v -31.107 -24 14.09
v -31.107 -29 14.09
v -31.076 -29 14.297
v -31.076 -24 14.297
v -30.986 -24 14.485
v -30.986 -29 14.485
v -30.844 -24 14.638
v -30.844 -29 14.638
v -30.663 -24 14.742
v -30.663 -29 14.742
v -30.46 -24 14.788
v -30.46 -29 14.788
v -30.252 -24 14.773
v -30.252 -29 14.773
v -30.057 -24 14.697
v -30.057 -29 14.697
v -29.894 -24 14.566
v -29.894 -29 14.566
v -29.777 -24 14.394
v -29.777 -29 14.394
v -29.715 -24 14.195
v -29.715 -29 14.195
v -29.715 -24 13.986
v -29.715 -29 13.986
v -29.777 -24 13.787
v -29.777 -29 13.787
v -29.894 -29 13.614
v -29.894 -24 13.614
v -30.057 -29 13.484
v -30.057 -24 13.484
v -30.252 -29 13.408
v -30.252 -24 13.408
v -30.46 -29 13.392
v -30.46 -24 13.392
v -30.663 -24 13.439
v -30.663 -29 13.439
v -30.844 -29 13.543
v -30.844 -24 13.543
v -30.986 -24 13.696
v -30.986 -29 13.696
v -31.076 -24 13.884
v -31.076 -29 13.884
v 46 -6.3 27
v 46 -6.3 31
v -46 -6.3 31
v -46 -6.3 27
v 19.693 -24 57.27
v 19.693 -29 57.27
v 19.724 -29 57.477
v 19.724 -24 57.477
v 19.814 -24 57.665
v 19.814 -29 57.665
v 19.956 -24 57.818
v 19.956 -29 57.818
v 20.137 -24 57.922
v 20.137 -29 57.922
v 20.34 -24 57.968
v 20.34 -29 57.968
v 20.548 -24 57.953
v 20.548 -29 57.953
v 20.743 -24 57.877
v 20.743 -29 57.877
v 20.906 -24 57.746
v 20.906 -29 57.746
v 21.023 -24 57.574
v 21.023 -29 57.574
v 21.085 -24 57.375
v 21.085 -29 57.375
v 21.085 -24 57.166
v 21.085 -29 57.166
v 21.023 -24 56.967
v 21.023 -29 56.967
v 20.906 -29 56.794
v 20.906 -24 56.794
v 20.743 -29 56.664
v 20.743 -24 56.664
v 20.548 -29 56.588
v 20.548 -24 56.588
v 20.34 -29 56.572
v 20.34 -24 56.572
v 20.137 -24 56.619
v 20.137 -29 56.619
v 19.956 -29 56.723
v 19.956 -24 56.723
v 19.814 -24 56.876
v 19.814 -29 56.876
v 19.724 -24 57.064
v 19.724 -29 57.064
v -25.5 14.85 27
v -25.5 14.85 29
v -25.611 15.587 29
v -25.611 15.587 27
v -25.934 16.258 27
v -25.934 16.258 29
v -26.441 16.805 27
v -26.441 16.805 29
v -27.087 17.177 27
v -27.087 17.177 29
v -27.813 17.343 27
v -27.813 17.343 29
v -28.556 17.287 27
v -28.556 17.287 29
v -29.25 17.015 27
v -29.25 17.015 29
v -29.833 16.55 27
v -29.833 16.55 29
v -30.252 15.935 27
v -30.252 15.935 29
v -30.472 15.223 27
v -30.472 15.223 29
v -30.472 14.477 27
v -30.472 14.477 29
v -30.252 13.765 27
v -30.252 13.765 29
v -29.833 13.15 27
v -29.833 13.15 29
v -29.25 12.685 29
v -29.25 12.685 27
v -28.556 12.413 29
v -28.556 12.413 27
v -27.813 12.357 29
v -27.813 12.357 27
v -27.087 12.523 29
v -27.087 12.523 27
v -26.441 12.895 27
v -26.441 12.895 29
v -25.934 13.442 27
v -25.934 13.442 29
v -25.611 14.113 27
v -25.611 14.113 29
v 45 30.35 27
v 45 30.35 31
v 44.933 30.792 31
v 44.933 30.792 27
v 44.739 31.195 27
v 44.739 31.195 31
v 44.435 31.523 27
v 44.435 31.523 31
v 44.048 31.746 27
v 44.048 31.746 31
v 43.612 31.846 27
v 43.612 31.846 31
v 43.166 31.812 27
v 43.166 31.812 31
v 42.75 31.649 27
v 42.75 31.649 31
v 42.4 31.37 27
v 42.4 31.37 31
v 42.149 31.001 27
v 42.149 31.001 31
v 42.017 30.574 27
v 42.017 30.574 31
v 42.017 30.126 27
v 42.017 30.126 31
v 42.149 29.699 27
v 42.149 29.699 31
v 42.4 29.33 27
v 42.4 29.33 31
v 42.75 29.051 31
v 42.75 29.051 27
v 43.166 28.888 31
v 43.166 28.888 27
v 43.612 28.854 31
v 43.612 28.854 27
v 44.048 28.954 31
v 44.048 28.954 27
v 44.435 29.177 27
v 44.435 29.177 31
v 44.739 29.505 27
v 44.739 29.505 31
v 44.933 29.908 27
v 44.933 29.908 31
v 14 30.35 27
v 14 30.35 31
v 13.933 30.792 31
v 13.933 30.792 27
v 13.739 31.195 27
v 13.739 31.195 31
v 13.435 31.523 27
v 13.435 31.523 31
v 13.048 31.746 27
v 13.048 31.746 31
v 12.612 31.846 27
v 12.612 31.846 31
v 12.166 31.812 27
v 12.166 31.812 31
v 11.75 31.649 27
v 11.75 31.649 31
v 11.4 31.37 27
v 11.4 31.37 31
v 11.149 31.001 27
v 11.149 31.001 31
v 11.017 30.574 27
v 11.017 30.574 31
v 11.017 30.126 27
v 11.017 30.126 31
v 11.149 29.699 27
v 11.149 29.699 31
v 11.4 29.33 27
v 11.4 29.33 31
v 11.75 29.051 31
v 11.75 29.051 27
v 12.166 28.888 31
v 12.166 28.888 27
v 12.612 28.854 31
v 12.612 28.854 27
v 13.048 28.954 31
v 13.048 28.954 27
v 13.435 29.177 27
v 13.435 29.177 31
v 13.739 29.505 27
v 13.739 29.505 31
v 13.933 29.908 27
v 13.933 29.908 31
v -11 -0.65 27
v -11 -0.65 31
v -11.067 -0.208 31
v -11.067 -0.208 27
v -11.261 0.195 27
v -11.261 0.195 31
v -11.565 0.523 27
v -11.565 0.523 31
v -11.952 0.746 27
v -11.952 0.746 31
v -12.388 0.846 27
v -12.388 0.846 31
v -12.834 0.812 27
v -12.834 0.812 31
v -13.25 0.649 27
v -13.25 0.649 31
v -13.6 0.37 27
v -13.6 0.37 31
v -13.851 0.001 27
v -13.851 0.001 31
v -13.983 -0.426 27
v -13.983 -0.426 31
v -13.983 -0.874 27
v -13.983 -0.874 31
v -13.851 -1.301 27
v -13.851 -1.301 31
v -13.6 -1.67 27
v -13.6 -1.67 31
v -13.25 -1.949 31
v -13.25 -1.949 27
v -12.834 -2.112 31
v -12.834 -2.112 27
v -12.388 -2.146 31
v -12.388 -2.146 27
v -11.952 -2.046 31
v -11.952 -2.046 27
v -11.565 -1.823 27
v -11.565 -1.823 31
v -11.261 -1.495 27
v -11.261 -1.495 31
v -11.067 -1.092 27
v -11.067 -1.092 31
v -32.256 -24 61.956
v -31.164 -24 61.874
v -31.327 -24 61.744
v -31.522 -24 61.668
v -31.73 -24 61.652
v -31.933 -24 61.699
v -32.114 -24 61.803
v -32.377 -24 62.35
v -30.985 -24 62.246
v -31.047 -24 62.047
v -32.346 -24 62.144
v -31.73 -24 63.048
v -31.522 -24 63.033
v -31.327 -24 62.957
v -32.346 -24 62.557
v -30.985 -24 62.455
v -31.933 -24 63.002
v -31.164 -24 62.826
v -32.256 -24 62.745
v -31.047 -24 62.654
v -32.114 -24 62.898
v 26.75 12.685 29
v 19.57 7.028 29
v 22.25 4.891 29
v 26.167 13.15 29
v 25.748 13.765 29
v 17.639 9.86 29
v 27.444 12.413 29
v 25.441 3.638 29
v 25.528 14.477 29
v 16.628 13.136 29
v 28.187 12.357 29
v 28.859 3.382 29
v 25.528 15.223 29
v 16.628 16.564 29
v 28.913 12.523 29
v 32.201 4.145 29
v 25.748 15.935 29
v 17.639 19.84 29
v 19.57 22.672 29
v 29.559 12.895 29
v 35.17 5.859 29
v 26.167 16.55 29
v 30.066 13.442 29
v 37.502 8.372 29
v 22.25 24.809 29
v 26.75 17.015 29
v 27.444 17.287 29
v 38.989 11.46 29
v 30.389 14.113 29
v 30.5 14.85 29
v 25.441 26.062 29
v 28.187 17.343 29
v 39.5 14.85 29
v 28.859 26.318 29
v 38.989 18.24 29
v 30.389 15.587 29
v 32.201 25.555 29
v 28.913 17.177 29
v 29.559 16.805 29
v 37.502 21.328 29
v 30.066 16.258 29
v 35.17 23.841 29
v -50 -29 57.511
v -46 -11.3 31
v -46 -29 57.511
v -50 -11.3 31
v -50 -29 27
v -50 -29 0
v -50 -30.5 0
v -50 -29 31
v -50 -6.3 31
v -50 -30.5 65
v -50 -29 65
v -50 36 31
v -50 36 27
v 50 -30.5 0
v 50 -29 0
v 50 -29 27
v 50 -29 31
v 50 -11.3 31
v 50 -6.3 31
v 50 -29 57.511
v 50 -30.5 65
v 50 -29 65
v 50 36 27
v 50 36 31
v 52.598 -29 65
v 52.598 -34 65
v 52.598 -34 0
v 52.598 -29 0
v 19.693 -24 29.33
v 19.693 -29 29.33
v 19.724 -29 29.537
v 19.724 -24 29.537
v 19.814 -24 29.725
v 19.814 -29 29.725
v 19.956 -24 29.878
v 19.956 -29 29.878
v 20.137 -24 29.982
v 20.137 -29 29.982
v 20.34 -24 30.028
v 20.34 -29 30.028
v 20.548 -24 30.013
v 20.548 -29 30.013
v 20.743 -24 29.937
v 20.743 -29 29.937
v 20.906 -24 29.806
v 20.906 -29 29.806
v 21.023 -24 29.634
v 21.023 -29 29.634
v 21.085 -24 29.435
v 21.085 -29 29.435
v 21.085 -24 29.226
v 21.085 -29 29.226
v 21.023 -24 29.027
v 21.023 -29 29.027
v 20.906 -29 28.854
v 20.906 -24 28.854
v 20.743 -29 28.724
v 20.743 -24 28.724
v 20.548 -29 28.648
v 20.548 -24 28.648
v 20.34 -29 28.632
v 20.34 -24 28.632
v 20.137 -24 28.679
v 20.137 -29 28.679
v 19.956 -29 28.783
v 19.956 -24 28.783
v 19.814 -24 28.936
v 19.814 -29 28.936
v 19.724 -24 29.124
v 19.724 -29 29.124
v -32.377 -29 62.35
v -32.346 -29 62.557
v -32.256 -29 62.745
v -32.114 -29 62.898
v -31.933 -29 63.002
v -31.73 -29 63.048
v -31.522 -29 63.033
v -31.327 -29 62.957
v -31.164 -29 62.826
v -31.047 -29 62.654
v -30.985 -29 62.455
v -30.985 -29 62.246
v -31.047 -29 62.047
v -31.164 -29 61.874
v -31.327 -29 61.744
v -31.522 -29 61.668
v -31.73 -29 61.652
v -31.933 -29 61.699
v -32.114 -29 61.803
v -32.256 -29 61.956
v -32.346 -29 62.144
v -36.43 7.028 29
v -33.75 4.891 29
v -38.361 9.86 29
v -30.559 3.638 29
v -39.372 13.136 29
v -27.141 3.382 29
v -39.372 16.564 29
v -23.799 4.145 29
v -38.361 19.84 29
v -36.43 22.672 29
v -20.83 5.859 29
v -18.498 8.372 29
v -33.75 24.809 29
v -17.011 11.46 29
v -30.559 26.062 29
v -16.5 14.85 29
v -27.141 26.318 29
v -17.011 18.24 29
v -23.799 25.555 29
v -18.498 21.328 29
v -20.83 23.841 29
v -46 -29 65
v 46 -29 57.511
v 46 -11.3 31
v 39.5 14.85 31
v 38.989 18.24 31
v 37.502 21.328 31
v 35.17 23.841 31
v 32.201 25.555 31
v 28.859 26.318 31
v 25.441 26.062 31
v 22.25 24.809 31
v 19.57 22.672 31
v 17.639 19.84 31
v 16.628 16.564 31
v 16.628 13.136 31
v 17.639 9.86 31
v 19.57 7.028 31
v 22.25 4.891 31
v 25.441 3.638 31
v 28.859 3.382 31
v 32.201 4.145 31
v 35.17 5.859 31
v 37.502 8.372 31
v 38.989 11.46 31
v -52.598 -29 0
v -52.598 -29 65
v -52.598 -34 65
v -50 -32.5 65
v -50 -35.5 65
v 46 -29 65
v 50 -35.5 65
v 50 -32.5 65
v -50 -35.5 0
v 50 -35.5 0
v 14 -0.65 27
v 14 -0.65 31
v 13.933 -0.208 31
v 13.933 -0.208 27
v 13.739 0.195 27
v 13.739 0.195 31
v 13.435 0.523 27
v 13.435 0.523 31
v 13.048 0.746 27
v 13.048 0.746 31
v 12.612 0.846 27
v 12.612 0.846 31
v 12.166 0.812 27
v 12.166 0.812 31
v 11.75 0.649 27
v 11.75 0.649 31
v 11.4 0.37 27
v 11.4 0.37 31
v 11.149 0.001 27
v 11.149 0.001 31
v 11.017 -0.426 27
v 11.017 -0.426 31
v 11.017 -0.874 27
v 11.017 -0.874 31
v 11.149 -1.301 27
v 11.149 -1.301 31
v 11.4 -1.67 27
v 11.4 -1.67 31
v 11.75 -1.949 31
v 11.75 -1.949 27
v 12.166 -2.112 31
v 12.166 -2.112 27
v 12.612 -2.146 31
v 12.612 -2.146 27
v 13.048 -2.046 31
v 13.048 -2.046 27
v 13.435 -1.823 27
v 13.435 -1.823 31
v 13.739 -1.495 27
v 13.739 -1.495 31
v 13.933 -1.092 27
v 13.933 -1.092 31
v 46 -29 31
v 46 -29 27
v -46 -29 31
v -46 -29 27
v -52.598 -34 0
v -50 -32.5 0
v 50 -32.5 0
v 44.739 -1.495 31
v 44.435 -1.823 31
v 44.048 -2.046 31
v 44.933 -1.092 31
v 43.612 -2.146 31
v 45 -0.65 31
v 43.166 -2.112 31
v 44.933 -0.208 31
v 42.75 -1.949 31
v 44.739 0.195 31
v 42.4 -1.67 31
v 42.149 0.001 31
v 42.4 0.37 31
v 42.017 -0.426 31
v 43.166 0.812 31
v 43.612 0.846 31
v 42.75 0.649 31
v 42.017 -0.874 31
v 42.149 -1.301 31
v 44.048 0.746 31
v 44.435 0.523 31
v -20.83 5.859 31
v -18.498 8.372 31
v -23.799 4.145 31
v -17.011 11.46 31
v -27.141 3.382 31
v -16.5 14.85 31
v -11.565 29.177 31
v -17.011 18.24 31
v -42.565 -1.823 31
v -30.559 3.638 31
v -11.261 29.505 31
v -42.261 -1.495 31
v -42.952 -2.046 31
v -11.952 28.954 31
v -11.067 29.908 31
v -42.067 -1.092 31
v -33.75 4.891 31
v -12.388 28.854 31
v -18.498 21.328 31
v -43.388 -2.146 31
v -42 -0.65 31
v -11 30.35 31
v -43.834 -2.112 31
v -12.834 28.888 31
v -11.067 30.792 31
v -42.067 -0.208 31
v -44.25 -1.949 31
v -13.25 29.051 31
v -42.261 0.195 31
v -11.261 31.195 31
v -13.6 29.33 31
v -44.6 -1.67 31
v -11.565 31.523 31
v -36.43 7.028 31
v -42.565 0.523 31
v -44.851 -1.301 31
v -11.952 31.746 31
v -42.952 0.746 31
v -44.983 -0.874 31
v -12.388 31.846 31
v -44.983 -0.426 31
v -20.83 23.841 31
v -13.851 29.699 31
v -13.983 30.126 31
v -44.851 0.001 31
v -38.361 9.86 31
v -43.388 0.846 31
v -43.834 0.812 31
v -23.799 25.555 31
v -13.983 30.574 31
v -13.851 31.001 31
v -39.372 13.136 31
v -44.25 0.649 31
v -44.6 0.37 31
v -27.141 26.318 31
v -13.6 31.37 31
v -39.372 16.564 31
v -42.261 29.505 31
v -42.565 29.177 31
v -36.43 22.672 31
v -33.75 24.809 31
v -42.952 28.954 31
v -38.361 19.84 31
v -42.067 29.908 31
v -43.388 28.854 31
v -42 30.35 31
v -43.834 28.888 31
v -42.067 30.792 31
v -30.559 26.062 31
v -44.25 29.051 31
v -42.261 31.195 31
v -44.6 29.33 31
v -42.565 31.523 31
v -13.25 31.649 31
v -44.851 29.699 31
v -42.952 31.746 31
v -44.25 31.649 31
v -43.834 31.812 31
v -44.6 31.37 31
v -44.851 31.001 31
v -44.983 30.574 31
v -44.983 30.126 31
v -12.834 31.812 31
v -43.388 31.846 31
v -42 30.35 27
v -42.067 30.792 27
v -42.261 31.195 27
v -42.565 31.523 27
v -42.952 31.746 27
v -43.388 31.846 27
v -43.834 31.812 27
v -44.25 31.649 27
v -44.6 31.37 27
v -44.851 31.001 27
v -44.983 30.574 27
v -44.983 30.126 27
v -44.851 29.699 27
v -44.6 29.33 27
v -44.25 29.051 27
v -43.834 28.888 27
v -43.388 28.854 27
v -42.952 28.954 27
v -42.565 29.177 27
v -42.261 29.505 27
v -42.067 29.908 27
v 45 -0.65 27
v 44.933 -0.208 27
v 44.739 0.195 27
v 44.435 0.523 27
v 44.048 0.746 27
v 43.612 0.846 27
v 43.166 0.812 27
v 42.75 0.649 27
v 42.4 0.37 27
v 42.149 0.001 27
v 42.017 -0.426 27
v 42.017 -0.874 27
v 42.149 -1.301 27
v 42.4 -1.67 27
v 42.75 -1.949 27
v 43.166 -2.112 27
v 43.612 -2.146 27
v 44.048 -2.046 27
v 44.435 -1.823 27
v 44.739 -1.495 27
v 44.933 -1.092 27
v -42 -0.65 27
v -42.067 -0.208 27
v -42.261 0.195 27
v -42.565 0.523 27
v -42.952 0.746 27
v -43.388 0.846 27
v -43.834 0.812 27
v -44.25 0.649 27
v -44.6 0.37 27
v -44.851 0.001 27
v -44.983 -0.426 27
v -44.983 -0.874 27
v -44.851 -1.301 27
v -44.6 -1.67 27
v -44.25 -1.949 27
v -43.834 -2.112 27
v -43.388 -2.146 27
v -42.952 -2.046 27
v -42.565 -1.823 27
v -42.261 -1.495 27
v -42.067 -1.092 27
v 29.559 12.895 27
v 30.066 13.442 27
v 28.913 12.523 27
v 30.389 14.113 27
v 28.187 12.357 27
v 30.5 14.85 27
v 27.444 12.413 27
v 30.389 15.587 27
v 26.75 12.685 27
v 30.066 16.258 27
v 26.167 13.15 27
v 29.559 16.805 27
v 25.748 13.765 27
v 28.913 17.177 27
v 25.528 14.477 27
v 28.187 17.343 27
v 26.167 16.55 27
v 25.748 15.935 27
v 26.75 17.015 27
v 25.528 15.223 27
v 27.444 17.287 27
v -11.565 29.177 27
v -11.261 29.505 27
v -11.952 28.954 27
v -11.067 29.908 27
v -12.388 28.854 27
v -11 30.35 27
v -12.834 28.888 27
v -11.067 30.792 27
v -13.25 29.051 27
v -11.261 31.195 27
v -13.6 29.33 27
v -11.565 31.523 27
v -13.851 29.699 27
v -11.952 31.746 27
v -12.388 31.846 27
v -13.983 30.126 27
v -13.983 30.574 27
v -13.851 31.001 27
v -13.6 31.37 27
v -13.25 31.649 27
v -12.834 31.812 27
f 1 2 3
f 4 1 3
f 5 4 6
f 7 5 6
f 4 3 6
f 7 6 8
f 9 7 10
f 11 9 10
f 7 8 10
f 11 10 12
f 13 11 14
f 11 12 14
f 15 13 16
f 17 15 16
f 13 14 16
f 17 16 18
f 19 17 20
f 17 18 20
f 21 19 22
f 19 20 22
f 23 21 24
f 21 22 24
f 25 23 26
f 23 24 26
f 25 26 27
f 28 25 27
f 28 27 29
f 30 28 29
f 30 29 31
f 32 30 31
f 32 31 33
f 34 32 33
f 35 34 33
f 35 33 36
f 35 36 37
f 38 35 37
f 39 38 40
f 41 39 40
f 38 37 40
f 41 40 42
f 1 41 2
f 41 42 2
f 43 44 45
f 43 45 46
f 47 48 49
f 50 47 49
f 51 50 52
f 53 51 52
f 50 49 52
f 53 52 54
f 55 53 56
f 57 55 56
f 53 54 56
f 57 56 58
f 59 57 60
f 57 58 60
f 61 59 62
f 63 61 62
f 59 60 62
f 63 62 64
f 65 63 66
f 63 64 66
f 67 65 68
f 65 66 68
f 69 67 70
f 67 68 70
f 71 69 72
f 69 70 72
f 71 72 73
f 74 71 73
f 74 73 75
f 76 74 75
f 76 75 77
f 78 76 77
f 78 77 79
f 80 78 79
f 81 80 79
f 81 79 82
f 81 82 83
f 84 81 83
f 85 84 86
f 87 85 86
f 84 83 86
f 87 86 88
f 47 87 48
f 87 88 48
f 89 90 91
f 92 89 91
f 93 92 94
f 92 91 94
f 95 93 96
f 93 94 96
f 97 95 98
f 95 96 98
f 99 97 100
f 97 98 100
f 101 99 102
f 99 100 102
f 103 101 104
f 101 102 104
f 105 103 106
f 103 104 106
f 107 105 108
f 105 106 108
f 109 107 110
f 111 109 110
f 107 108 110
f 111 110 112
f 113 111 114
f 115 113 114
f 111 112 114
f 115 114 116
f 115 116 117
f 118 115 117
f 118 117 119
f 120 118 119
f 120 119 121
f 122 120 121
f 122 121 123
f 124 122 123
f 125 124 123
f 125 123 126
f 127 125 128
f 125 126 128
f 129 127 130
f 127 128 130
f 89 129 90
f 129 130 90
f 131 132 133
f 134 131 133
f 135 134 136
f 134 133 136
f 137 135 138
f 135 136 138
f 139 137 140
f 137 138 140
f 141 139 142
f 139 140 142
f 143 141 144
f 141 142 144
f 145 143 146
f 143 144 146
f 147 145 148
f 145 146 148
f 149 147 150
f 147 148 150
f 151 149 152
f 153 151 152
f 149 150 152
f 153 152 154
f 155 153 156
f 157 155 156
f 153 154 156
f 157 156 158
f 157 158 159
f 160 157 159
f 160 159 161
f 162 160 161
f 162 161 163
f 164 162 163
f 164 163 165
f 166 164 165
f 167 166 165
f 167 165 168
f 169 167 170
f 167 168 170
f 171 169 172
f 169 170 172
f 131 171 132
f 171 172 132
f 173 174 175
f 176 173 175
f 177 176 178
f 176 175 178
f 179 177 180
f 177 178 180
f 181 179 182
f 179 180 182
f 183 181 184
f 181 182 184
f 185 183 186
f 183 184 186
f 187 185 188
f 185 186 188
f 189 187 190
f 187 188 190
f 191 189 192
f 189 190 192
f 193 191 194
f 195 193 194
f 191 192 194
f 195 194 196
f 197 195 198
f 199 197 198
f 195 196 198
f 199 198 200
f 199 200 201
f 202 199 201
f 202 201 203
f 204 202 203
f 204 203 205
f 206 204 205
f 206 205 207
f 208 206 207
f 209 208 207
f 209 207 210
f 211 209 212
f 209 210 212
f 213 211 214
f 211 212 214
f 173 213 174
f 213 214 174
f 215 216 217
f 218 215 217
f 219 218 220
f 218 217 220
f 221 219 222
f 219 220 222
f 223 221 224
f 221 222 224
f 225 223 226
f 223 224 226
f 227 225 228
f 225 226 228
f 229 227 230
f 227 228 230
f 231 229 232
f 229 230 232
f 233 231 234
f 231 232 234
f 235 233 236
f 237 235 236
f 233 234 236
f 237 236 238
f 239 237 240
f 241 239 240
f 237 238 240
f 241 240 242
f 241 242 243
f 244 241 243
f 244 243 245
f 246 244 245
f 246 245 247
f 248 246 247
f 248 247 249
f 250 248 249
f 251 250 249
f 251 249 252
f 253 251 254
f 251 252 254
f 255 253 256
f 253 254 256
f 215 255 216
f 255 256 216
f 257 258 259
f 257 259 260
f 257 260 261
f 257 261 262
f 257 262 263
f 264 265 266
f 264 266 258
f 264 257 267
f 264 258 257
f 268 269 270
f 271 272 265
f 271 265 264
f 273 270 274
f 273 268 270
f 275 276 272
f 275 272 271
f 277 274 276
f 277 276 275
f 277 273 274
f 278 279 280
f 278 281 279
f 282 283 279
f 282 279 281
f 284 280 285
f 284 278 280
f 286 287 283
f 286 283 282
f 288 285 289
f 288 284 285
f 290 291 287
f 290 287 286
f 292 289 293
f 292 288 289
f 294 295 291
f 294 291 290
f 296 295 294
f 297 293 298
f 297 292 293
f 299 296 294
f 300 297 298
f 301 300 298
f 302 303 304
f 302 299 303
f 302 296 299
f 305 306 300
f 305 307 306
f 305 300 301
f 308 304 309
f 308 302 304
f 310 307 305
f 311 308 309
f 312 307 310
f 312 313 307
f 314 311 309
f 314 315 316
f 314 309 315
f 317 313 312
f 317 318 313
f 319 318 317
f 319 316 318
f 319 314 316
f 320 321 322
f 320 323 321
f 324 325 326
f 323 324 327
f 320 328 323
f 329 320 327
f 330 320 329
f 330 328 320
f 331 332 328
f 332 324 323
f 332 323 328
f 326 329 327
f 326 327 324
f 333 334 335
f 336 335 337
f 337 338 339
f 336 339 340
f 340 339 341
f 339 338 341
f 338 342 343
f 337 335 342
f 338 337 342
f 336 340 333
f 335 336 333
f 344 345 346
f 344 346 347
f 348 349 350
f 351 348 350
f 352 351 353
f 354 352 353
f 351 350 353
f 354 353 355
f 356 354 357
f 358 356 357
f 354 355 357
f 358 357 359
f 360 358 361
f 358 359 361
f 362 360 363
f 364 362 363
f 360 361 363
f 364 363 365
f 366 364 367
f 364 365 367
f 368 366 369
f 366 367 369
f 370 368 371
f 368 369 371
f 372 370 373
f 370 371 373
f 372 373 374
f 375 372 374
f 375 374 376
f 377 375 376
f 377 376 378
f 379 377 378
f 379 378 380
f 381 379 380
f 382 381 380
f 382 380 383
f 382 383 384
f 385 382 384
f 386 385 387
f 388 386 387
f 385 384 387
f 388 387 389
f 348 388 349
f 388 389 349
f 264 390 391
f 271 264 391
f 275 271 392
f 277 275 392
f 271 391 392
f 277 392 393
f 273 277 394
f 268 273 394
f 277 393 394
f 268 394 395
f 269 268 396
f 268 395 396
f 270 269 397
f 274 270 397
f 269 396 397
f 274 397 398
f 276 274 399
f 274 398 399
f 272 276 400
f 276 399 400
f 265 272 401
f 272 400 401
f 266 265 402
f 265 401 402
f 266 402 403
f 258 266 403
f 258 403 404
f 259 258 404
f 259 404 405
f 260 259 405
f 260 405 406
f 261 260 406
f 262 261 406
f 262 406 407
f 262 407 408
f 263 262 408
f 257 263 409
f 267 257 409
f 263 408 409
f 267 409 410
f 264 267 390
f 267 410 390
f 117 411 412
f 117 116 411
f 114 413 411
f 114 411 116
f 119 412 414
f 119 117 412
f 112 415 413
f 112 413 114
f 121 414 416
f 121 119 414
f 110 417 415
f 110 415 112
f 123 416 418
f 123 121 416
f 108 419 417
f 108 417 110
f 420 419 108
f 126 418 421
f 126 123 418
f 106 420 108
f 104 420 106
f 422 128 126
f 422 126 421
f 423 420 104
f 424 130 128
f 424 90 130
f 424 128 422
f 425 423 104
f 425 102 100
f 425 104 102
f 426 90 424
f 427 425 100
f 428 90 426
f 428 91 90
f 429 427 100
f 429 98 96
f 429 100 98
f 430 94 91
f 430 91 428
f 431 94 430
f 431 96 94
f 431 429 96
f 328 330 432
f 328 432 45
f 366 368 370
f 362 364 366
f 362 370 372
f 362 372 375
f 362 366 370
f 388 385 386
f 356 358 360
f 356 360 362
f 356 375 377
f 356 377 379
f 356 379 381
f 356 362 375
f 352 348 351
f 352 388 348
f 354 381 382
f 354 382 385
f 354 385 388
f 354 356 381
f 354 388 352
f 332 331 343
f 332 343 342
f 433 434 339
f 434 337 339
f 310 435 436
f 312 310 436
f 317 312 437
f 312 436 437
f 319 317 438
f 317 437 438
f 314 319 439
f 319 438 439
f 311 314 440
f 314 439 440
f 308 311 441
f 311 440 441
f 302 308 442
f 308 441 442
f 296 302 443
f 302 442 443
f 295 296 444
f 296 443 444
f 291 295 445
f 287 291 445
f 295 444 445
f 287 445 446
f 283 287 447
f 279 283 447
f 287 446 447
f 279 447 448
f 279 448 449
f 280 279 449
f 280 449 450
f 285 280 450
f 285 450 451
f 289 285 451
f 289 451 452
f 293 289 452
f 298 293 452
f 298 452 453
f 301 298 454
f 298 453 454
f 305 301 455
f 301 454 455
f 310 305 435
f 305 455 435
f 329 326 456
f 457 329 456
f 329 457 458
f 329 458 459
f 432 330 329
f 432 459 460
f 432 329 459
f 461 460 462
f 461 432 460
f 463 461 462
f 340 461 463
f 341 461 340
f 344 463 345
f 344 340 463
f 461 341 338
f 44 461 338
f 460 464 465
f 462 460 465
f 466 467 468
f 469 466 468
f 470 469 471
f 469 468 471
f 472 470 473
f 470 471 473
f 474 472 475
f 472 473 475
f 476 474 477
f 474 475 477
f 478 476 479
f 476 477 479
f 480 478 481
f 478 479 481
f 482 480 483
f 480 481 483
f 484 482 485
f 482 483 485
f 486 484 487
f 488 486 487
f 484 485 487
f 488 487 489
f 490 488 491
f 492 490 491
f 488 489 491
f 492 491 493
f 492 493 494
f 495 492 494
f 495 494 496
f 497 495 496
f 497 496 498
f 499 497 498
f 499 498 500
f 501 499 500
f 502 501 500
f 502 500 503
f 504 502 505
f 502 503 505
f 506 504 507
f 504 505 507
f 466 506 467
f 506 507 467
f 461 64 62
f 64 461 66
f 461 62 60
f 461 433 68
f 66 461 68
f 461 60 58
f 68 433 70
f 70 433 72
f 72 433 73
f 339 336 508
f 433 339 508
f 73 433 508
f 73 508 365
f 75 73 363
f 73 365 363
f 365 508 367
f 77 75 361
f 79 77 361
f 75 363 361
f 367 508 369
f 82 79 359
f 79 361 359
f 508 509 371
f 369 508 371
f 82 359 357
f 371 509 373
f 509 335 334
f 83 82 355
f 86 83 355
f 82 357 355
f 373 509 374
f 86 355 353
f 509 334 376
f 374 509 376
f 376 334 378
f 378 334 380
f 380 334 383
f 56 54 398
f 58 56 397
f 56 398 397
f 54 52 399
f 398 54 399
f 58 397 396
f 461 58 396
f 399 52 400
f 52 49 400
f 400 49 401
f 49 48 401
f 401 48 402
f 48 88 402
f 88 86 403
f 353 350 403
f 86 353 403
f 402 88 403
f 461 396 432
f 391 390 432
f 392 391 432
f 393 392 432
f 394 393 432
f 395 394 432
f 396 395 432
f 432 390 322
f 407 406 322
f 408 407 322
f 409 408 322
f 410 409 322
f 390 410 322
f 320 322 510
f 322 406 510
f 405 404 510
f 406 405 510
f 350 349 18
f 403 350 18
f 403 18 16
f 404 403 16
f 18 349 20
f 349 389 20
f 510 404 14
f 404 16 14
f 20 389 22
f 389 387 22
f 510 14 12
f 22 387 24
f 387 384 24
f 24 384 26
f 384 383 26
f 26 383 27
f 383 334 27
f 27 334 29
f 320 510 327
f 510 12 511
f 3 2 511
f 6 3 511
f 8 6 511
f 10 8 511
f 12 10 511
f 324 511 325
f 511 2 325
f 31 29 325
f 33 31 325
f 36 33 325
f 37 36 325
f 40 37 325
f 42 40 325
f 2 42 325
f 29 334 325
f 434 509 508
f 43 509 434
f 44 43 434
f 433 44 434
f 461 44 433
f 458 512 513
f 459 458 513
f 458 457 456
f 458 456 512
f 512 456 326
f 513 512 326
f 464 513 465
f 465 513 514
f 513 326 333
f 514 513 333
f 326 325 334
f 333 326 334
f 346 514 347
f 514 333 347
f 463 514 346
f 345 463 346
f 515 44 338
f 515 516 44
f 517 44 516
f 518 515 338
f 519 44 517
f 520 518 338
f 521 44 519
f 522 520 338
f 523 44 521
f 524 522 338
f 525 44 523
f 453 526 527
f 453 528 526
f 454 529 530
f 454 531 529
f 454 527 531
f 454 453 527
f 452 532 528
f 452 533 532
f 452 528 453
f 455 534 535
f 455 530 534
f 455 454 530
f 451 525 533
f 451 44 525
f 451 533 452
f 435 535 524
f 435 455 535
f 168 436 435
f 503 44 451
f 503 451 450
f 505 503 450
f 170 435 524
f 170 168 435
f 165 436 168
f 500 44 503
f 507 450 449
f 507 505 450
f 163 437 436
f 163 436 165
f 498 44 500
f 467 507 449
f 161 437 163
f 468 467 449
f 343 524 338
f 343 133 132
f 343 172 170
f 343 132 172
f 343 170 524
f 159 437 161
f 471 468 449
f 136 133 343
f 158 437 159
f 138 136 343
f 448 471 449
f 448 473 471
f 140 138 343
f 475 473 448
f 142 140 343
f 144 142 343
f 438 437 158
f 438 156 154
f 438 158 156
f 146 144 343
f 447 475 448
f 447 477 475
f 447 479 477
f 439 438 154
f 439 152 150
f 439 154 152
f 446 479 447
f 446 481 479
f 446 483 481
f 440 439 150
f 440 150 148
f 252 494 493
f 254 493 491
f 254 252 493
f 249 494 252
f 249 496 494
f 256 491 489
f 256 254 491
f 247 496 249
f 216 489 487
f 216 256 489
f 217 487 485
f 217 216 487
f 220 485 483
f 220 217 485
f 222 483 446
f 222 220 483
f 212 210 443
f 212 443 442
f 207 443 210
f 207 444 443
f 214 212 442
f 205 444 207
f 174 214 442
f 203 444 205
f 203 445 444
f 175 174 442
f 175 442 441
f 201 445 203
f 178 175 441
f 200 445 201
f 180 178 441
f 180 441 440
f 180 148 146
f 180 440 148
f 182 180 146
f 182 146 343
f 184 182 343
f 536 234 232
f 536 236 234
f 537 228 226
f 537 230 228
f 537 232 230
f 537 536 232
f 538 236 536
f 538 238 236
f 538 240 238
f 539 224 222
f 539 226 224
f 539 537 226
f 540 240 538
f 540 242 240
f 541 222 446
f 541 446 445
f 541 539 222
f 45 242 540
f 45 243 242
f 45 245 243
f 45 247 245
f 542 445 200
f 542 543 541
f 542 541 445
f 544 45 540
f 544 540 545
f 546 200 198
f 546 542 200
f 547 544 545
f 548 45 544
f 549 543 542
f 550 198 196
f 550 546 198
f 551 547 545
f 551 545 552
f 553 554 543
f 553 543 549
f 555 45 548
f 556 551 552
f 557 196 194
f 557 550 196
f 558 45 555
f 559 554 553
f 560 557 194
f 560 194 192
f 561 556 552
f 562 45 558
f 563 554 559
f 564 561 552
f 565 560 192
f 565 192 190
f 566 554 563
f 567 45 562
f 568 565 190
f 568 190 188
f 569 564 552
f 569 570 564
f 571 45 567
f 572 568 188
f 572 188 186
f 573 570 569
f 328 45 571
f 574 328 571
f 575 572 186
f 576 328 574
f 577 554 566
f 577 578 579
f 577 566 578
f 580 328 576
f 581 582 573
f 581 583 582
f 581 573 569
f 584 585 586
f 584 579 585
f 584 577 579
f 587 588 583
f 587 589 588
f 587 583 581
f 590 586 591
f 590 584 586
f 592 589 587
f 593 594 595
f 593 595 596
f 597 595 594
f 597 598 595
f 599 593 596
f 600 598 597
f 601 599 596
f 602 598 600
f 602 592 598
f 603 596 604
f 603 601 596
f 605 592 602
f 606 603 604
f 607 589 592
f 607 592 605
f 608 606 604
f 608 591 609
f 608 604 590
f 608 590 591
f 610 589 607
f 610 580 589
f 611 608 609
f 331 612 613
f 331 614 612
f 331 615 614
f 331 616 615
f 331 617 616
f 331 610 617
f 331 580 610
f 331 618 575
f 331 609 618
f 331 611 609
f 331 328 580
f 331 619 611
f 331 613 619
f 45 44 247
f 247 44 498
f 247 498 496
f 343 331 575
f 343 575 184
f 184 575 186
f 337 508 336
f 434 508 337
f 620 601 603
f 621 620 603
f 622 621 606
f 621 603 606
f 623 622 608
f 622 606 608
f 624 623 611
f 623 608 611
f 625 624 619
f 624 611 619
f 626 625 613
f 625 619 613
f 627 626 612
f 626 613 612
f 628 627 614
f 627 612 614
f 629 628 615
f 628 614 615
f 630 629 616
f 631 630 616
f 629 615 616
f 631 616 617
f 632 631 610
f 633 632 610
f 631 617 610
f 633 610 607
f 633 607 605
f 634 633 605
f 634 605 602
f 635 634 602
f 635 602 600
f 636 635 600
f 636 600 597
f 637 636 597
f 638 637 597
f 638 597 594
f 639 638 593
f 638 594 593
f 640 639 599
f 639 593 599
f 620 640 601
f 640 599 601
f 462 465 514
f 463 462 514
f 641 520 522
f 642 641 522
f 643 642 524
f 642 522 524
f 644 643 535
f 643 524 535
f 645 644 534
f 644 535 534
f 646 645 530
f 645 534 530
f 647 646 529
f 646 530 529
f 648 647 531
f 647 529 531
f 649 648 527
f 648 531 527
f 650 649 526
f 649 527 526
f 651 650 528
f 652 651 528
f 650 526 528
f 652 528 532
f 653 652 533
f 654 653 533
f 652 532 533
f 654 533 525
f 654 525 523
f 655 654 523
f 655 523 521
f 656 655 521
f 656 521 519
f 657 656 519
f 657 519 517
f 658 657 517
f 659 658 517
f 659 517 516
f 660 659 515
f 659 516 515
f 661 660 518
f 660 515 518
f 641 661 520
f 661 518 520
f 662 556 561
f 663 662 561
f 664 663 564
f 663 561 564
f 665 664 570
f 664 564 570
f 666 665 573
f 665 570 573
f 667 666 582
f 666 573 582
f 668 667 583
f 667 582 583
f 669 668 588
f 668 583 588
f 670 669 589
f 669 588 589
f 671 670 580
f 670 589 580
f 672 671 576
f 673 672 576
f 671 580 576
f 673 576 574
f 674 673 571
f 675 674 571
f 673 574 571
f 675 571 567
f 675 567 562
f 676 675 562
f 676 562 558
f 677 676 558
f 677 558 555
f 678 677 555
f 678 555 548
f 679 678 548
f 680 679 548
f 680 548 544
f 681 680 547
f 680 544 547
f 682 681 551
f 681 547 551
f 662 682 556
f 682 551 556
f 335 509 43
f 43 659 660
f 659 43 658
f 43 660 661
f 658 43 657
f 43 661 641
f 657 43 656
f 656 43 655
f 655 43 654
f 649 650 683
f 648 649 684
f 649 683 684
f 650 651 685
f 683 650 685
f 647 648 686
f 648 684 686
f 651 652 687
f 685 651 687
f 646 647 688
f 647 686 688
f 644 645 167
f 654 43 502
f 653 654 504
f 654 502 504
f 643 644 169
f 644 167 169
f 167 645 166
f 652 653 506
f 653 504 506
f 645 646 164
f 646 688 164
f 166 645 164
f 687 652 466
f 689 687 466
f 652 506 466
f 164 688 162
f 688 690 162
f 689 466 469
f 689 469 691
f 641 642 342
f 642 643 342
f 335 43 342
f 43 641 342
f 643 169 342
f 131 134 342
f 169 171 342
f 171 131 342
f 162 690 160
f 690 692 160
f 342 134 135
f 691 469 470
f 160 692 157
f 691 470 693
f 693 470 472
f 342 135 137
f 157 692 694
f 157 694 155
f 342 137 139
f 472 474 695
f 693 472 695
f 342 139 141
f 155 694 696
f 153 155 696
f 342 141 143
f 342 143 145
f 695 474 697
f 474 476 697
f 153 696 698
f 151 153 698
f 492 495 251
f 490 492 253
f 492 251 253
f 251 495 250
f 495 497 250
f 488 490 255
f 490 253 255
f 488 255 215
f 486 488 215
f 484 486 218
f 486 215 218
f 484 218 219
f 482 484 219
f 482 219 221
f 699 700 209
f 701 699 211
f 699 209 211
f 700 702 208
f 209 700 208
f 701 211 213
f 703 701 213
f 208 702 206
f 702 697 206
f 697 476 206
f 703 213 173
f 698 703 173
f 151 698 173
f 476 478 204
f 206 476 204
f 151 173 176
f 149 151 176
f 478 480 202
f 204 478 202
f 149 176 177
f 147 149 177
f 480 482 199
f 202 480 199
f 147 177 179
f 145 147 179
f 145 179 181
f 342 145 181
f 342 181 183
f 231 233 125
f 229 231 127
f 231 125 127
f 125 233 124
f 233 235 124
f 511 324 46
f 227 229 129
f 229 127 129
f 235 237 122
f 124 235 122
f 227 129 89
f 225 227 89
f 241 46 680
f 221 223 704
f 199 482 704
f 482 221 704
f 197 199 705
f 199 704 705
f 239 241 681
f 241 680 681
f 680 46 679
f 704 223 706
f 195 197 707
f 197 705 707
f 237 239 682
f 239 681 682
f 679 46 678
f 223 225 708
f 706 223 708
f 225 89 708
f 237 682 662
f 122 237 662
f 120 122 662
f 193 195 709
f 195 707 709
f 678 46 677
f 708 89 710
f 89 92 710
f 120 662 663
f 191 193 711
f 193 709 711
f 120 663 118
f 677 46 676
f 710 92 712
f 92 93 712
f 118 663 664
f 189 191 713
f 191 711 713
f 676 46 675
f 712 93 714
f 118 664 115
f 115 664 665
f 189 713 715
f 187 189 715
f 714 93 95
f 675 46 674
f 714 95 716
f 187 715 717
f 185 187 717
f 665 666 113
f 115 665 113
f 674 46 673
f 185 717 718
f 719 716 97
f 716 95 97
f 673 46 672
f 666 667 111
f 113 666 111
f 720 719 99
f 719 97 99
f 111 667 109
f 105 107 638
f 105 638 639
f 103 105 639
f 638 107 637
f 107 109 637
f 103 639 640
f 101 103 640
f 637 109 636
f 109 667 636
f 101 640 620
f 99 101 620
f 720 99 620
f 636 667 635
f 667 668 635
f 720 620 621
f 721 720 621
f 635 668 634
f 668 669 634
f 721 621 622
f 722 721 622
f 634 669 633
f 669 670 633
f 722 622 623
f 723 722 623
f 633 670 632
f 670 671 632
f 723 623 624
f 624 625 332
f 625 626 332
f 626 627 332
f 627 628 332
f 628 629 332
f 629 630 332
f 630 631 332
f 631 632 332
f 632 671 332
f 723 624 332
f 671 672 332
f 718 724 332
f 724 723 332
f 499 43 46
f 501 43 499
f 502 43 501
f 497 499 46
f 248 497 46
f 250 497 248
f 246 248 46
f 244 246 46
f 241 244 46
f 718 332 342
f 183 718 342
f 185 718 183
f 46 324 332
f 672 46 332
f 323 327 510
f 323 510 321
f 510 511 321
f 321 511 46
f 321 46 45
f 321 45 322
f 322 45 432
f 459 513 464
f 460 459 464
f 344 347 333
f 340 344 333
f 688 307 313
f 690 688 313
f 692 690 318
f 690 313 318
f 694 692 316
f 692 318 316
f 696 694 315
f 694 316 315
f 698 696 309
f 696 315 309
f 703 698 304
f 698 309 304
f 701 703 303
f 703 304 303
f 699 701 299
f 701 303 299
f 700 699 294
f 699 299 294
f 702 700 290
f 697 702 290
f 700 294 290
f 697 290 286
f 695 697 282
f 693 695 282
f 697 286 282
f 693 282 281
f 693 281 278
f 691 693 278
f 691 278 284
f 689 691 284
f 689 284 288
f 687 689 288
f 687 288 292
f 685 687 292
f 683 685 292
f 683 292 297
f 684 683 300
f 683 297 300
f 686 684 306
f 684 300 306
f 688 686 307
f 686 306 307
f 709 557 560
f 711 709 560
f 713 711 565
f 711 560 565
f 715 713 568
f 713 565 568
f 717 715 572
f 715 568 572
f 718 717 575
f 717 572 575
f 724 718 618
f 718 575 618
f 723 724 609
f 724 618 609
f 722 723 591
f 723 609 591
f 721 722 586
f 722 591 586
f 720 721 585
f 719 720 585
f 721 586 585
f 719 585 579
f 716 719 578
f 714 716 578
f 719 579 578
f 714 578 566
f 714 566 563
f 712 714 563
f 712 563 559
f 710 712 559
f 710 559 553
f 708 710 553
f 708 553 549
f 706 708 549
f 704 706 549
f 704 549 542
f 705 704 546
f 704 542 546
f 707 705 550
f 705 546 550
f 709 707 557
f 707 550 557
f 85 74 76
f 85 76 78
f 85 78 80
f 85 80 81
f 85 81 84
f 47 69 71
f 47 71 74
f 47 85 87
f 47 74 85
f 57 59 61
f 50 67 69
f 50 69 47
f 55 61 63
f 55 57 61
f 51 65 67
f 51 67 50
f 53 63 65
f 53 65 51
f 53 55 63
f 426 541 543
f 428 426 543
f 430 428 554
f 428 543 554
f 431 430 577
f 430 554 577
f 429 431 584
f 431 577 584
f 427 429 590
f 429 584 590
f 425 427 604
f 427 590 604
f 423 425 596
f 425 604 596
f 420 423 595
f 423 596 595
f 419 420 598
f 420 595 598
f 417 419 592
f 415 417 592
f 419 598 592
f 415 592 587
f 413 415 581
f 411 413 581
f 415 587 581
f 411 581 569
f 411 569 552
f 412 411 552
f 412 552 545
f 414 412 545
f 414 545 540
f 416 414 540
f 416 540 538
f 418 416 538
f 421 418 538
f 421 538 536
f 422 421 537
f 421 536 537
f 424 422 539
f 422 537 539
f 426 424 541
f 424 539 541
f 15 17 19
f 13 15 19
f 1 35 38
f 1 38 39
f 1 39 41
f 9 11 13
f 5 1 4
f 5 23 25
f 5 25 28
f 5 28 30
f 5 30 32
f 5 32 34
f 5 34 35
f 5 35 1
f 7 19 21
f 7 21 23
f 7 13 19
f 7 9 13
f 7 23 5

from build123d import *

# Parameters (mm, degrees)
EXTRUDE_7_DEPTH     = 65
SKETCH_6_W          = 4
SKETCH_6_H          = 4
EXTRUDE_10_DEPTH    = 65
SKETCH_7_W          = 4
SKETCH_7_H          = 42.3
EXTRUDE_11_DEPTH    = 92
SKETCH_8_R          = 11.5
CUT_EXTRUDE_2_DEPTH = 2
SKETCH_10_R         = 2.5
CUT_EXTRUDE_3_DEPTH = 2
SKETCH_11_R         = 1.5
CUT_EXTRUDE_6_DEPTH = 4
EXTRUDE_13_DEPTH    = 2
SKETCH_14_R         = 0.7
EXTRUDE_14_DEPTH    = 5


with BuildPart() as part:
    # 草图1 → 凸台-拉伸7 (new body)
    with BuildSketch(Plane.XY):
        Polygon((-50, -29), (-50, -30.5), (-52.598076211, -29), (-52.598076211, -34), (-50, -32.5), (-50, -35.5), (50, -35.5), (50, -32.5), (52.598076211, -34), (52.598076211, -29), (50, -30.5), (50, -29), align=None)
    extrude(amount=EXTRUDE_7_DEPTH)

    # 草图6 → 凸台-拉伸10 (add)
    with BuildSketch(Plane(origin=(0, -29, 0), x_dir=(1, 0, 0), z_dir=(0, 1, 0))):
        with Locations((-48, -29)):
            Rectangle(SKETCH_6_W, SKETCH_6_H)
    extrude_10 = extrude(amount=EXTRUDE_10_DEPTH)

    # 镜向1: 凸台-拉伸10 across plane
    add(extrude_10.mirror(Plane(origin=(0, 0, 0), x_dir=(0, 0, 1), z_dir=(1, 0, 0))))

    # 草图7 → 凸台-拉伸11 (add)
    with BuildSketch(Plane(origin=(-46, 0, 0), x_dir=(0, 0, -1), z_dir=(1, 0, 0))):
        with Locations((-29, 14.85)):
            Rectangle(SKETCH_7_W, SKETCH_7_H)
    extrude(amount=EXTRUDE_11_DEPTH)

    # 草图8 → 切除-拉伸2 (cut)
    with BuildSketch(Plane.XY.offset(31)):
        with Locations((-28, 14.85)):
            Circle(SKETCH_8_R)
        with Locations((28, 14.85)):
            Circle(SKETCH_8_R)
    extrude(amount=-CUT_EXTRUDE_2_DEPTH, mode=Mode.SUBTRACT)

    # 草图10 → 切除-拉伸3 (cut)
    with BuildSketch(Plane.XY.offset(29)):
        with Locations((-28, 14.85)):
            Circle(SKETCH_10_R)
        with Locations((28, 14.85)):
            Circle(SKETCH_10_R)
    extrude(amount=-CUT_EXTRUDE_3_DEPTH, mode=Mode.SUBTRACT)

    # 草图11 → 切除-拉伸6 (cut)
    with BuildSketch(Plane.XY.offset(31)):
        with Locations((-43.5, 30.35)):
            Circle(SKETCH_11_R)
        with Locations((-12.5, 30.35)):
            Circle(SKETCH_11_R)
        with Locations((-43.5, -0.65)):
            Circle(SKETCH_11_R)
        with Locations((-12.5, -0.65)):
            Circle(SKETCH_11_R)
        with Locations((12.5, 30.35)):
            Circle(SKETCH_11_R)
        with Locations((43.5, 30.35)):
            Circle(SKETCH_11_R)
        with Locations((12.5, -0.65)):
            Circle(SKETCH_11_R)
        with Locations((43.5, -0.65)):
            Circle(SKETCH_11_R)
    extrude(amount=-CUT_EXTRUDE_6_DEPTH, mode=Mode.SUBTRACT)

    # 草图13 → 凸台-拉伸13 (add, symmetric)
    with BuildSketch(Plane(origin=(48, 0, 0), x_dir=(0, 0, -1), z_dir=(1, 0, 0))):
        Polygon((-65, -29), (-31, -6.3), (-31, -11.3), (-57.511013216, -29), align=None)
    extrude_13 = extrude(amount=EXTRUDE_13_DEPTH, both=True)

    # 镜向3: 凸台-拉伸13 across plane
    add(extrude_13.mirror(Plane(origin=(0, 0, 0), x_dir=(0, 0, 1), z_dir=(1, 0, 0))))

    # 草图14 → 凸台-拉伸14 (add)
    with BuildSketch(Plane(origin=(0, -29, 0), x_dir=(1, 0, 0), z_dir=(0, 1, 0))):
        with Locations(Location((-30.407474137, -14.090366943, 0), (0, 0, 180))):
            Circle(SKETCH_14_R)
        with Locations(Location((-31.677474137, -62.350366943, 0), (0, 0, 180))):
            Circle(SKETCH_14_R)
        with Locations(Location((20.392525863, -29.330366943, 0), (0, 0, 180))):
            Circle(SKETCH_14_R)
        with Locations(Location((20.392525863, -57.270366943, 0), (0, 0, 180))):
            Circle(SKETCH_14_R)
    extrude(amount=EXTRUDE_14_DEPTH)


solid = part.part
